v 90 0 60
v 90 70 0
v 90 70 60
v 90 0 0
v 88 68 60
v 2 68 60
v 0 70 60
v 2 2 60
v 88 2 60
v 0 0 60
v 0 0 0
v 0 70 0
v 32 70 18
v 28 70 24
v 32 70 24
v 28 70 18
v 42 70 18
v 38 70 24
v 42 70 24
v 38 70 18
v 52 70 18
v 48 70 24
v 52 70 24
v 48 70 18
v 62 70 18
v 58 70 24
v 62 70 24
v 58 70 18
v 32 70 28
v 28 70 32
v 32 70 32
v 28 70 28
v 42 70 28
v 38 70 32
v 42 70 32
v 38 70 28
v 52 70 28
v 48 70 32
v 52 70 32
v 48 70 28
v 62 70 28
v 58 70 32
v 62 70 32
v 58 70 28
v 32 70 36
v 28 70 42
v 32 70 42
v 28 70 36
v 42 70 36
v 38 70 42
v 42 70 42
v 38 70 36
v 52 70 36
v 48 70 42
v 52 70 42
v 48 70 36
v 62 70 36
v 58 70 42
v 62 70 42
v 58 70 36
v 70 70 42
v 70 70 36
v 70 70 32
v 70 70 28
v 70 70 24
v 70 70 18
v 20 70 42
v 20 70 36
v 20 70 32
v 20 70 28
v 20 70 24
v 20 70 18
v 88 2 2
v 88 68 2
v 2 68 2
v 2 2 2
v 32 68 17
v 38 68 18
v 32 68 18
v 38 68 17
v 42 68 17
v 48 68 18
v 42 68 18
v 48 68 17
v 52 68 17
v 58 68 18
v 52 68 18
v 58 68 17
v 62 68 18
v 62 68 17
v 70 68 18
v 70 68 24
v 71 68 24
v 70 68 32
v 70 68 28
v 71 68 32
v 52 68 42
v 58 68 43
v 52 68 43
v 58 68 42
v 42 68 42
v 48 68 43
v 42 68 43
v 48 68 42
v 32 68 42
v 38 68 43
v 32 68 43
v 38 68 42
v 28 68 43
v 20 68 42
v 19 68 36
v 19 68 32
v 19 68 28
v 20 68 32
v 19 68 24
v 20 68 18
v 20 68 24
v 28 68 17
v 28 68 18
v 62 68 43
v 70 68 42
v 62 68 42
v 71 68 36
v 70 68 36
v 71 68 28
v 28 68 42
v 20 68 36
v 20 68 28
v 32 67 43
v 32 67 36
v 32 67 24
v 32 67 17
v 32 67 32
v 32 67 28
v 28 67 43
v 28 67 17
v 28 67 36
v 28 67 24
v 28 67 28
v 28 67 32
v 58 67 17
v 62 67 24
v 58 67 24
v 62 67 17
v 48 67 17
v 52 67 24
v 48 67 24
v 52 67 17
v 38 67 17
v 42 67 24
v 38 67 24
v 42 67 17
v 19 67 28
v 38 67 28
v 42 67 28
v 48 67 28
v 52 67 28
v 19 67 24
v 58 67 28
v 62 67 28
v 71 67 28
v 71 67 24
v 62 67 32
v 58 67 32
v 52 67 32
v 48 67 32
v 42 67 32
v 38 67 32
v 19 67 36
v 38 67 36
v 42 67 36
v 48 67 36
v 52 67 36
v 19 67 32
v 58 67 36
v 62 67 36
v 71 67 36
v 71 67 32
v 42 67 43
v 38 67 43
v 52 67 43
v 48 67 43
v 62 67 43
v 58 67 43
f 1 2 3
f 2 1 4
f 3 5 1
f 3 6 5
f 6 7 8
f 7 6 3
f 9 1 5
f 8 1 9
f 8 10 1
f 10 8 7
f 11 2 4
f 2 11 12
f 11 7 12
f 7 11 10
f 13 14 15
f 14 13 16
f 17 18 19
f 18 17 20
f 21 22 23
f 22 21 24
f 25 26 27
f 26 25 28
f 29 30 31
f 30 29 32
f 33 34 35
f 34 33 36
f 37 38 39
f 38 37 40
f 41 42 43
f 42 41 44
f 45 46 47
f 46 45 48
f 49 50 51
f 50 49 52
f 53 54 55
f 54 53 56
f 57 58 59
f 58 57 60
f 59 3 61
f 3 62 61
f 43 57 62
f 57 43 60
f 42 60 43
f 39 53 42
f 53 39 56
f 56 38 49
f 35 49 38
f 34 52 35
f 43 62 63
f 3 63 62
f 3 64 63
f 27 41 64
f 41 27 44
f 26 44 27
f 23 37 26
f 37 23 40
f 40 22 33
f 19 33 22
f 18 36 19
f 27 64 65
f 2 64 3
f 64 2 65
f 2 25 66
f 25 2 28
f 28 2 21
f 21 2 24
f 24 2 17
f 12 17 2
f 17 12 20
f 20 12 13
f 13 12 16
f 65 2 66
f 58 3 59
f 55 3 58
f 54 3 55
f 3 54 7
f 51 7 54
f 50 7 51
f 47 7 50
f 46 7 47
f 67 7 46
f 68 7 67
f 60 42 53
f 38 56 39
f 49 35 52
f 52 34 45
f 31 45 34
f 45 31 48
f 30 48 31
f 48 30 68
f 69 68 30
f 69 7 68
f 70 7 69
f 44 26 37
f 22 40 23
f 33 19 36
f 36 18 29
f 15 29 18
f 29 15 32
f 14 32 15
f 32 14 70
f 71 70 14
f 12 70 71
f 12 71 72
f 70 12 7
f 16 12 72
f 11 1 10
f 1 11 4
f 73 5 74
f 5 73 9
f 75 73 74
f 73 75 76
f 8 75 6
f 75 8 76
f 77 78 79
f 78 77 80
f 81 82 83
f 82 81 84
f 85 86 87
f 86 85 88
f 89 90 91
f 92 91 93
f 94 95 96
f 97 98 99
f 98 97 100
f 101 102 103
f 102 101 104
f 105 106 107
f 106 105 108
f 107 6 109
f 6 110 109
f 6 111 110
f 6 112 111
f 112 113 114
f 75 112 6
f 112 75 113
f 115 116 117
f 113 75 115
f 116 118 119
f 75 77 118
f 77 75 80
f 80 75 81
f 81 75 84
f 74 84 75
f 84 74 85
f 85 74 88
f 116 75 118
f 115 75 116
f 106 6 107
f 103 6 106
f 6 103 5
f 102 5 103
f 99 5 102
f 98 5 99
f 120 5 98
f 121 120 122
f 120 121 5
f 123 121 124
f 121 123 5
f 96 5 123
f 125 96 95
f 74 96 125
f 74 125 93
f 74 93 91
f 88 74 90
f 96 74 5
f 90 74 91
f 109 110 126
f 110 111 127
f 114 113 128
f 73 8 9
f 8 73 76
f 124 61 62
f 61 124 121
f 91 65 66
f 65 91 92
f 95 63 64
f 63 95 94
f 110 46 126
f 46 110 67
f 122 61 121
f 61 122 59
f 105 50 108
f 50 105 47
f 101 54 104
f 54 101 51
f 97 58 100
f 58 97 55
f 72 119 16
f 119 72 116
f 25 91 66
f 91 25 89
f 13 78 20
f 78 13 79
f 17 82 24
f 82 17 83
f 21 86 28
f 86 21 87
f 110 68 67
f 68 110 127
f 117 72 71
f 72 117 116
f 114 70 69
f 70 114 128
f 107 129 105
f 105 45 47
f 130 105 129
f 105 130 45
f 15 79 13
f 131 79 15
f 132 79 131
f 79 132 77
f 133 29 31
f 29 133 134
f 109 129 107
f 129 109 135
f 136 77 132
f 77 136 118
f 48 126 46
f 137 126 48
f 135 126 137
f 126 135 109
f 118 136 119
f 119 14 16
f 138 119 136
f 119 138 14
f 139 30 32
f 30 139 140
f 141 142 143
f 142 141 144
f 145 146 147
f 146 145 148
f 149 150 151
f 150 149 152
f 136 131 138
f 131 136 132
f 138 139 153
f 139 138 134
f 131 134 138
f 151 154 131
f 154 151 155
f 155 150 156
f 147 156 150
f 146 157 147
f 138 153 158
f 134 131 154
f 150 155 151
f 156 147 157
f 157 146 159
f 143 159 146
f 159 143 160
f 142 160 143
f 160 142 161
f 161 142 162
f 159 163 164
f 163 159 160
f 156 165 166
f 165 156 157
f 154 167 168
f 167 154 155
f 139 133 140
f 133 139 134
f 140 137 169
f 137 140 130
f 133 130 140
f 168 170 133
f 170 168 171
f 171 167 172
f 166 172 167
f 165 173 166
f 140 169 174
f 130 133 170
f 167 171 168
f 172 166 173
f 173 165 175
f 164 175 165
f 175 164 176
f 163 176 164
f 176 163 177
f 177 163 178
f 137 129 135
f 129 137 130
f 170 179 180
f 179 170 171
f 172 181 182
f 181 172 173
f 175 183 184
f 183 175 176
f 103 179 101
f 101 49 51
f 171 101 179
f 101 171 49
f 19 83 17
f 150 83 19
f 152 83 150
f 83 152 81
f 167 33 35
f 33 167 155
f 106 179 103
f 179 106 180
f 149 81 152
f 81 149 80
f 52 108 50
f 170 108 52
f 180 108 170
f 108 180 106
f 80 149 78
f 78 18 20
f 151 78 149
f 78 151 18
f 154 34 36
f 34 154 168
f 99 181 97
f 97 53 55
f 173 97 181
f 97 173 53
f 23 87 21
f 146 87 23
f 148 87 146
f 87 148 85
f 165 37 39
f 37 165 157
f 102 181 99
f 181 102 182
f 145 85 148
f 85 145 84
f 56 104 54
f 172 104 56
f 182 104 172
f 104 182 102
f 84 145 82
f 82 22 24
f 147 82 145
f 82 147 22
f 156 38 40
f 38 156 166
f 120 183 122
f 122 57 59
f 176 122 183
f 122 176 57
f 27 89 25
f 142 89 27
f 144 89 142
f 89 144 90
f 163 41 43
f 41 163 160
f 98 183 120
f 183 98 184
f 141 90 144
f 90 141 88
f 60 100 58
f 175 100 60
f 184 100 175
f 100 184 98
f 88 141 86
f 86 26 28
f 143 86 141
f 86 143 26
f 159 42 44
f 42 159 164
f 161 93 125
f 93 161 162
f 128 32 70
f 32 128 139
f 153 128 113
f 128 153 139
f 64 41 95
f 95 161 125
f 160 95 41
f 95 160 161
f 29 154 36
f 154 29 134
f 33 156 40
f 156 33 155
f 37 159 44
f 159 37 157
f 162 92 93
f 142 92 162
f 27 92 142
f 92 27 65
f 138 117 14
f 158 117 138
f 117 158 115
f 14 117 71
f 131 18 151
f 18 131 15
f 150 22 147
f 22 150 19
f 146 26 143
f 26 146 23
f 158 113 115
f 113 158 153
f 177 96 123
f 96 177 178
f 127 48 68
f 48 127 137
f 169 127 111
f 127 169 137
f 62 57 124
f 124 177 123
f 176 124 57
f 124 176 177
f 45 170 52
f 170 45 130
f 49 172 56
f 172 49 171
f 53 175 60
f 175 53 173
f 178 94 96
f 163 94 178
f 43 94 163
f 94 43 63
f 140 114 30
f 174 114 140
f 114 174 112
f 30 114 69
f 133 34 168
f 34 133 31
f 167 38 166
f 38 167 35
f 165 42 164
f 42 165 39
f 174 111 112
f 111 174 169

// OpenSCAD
$fn = 32;

// ----------------------------------------------------------------------
// Vent box: crossgrid enclosure
// ----------------------------------------------------------------------

// --- parameters (mm) ---
box_l = 90;               // box length, X
box_w = 70;               // box width, Y
box_h = 60;               // box height, Z
wall_t = 2;               // shell wall thickness
win_l = 50;               // vent window width, X
win_h = 24;               // vent window height, Z
bar_w = 4;                // grid bar width
n_v = 4;                  // vertical bar count
n_h = 2;                  // horizontal bar count

win_z0 = (box_h - win_h) / 2;  // window lower edge Z
v_step = win_l / (n_v + 1);  // vertical bar step
h_step = win_h / (n_h + 1);  // horizontal bar step

difference() {
  union() {
    difference() {
      cube([box_l, box_w, box_h]);
  translate([wall_t, wall_t, wall_t])
    cube([box_l - 2 * wall_t, box_w - 2 * wall_t, box_h]);
  translate([(box_l - win_l) / 2, box_w - wall_t - 1, win_z0])
    cube([win_l, wall_t + 2, win_h]);
    }
    for (i = [1 : n_v])
      translate([(box_l - win_l) / 2 + i * v_step - bar_w / 2,
                 box_w - wall_t - 1, win_z0 - 1])
        cube([bar_w, wall_t + 1, win_h + 2]);
    for (i = [1 : n_h])
      translate([(box_l - win_l) / 2 - 1, box_w - wall_t - 1,
                 win_z0 + i * h_step - bar_w / 2])
        cube([win_l + 2, wall_t + 1, bar_w]);
  }
}
